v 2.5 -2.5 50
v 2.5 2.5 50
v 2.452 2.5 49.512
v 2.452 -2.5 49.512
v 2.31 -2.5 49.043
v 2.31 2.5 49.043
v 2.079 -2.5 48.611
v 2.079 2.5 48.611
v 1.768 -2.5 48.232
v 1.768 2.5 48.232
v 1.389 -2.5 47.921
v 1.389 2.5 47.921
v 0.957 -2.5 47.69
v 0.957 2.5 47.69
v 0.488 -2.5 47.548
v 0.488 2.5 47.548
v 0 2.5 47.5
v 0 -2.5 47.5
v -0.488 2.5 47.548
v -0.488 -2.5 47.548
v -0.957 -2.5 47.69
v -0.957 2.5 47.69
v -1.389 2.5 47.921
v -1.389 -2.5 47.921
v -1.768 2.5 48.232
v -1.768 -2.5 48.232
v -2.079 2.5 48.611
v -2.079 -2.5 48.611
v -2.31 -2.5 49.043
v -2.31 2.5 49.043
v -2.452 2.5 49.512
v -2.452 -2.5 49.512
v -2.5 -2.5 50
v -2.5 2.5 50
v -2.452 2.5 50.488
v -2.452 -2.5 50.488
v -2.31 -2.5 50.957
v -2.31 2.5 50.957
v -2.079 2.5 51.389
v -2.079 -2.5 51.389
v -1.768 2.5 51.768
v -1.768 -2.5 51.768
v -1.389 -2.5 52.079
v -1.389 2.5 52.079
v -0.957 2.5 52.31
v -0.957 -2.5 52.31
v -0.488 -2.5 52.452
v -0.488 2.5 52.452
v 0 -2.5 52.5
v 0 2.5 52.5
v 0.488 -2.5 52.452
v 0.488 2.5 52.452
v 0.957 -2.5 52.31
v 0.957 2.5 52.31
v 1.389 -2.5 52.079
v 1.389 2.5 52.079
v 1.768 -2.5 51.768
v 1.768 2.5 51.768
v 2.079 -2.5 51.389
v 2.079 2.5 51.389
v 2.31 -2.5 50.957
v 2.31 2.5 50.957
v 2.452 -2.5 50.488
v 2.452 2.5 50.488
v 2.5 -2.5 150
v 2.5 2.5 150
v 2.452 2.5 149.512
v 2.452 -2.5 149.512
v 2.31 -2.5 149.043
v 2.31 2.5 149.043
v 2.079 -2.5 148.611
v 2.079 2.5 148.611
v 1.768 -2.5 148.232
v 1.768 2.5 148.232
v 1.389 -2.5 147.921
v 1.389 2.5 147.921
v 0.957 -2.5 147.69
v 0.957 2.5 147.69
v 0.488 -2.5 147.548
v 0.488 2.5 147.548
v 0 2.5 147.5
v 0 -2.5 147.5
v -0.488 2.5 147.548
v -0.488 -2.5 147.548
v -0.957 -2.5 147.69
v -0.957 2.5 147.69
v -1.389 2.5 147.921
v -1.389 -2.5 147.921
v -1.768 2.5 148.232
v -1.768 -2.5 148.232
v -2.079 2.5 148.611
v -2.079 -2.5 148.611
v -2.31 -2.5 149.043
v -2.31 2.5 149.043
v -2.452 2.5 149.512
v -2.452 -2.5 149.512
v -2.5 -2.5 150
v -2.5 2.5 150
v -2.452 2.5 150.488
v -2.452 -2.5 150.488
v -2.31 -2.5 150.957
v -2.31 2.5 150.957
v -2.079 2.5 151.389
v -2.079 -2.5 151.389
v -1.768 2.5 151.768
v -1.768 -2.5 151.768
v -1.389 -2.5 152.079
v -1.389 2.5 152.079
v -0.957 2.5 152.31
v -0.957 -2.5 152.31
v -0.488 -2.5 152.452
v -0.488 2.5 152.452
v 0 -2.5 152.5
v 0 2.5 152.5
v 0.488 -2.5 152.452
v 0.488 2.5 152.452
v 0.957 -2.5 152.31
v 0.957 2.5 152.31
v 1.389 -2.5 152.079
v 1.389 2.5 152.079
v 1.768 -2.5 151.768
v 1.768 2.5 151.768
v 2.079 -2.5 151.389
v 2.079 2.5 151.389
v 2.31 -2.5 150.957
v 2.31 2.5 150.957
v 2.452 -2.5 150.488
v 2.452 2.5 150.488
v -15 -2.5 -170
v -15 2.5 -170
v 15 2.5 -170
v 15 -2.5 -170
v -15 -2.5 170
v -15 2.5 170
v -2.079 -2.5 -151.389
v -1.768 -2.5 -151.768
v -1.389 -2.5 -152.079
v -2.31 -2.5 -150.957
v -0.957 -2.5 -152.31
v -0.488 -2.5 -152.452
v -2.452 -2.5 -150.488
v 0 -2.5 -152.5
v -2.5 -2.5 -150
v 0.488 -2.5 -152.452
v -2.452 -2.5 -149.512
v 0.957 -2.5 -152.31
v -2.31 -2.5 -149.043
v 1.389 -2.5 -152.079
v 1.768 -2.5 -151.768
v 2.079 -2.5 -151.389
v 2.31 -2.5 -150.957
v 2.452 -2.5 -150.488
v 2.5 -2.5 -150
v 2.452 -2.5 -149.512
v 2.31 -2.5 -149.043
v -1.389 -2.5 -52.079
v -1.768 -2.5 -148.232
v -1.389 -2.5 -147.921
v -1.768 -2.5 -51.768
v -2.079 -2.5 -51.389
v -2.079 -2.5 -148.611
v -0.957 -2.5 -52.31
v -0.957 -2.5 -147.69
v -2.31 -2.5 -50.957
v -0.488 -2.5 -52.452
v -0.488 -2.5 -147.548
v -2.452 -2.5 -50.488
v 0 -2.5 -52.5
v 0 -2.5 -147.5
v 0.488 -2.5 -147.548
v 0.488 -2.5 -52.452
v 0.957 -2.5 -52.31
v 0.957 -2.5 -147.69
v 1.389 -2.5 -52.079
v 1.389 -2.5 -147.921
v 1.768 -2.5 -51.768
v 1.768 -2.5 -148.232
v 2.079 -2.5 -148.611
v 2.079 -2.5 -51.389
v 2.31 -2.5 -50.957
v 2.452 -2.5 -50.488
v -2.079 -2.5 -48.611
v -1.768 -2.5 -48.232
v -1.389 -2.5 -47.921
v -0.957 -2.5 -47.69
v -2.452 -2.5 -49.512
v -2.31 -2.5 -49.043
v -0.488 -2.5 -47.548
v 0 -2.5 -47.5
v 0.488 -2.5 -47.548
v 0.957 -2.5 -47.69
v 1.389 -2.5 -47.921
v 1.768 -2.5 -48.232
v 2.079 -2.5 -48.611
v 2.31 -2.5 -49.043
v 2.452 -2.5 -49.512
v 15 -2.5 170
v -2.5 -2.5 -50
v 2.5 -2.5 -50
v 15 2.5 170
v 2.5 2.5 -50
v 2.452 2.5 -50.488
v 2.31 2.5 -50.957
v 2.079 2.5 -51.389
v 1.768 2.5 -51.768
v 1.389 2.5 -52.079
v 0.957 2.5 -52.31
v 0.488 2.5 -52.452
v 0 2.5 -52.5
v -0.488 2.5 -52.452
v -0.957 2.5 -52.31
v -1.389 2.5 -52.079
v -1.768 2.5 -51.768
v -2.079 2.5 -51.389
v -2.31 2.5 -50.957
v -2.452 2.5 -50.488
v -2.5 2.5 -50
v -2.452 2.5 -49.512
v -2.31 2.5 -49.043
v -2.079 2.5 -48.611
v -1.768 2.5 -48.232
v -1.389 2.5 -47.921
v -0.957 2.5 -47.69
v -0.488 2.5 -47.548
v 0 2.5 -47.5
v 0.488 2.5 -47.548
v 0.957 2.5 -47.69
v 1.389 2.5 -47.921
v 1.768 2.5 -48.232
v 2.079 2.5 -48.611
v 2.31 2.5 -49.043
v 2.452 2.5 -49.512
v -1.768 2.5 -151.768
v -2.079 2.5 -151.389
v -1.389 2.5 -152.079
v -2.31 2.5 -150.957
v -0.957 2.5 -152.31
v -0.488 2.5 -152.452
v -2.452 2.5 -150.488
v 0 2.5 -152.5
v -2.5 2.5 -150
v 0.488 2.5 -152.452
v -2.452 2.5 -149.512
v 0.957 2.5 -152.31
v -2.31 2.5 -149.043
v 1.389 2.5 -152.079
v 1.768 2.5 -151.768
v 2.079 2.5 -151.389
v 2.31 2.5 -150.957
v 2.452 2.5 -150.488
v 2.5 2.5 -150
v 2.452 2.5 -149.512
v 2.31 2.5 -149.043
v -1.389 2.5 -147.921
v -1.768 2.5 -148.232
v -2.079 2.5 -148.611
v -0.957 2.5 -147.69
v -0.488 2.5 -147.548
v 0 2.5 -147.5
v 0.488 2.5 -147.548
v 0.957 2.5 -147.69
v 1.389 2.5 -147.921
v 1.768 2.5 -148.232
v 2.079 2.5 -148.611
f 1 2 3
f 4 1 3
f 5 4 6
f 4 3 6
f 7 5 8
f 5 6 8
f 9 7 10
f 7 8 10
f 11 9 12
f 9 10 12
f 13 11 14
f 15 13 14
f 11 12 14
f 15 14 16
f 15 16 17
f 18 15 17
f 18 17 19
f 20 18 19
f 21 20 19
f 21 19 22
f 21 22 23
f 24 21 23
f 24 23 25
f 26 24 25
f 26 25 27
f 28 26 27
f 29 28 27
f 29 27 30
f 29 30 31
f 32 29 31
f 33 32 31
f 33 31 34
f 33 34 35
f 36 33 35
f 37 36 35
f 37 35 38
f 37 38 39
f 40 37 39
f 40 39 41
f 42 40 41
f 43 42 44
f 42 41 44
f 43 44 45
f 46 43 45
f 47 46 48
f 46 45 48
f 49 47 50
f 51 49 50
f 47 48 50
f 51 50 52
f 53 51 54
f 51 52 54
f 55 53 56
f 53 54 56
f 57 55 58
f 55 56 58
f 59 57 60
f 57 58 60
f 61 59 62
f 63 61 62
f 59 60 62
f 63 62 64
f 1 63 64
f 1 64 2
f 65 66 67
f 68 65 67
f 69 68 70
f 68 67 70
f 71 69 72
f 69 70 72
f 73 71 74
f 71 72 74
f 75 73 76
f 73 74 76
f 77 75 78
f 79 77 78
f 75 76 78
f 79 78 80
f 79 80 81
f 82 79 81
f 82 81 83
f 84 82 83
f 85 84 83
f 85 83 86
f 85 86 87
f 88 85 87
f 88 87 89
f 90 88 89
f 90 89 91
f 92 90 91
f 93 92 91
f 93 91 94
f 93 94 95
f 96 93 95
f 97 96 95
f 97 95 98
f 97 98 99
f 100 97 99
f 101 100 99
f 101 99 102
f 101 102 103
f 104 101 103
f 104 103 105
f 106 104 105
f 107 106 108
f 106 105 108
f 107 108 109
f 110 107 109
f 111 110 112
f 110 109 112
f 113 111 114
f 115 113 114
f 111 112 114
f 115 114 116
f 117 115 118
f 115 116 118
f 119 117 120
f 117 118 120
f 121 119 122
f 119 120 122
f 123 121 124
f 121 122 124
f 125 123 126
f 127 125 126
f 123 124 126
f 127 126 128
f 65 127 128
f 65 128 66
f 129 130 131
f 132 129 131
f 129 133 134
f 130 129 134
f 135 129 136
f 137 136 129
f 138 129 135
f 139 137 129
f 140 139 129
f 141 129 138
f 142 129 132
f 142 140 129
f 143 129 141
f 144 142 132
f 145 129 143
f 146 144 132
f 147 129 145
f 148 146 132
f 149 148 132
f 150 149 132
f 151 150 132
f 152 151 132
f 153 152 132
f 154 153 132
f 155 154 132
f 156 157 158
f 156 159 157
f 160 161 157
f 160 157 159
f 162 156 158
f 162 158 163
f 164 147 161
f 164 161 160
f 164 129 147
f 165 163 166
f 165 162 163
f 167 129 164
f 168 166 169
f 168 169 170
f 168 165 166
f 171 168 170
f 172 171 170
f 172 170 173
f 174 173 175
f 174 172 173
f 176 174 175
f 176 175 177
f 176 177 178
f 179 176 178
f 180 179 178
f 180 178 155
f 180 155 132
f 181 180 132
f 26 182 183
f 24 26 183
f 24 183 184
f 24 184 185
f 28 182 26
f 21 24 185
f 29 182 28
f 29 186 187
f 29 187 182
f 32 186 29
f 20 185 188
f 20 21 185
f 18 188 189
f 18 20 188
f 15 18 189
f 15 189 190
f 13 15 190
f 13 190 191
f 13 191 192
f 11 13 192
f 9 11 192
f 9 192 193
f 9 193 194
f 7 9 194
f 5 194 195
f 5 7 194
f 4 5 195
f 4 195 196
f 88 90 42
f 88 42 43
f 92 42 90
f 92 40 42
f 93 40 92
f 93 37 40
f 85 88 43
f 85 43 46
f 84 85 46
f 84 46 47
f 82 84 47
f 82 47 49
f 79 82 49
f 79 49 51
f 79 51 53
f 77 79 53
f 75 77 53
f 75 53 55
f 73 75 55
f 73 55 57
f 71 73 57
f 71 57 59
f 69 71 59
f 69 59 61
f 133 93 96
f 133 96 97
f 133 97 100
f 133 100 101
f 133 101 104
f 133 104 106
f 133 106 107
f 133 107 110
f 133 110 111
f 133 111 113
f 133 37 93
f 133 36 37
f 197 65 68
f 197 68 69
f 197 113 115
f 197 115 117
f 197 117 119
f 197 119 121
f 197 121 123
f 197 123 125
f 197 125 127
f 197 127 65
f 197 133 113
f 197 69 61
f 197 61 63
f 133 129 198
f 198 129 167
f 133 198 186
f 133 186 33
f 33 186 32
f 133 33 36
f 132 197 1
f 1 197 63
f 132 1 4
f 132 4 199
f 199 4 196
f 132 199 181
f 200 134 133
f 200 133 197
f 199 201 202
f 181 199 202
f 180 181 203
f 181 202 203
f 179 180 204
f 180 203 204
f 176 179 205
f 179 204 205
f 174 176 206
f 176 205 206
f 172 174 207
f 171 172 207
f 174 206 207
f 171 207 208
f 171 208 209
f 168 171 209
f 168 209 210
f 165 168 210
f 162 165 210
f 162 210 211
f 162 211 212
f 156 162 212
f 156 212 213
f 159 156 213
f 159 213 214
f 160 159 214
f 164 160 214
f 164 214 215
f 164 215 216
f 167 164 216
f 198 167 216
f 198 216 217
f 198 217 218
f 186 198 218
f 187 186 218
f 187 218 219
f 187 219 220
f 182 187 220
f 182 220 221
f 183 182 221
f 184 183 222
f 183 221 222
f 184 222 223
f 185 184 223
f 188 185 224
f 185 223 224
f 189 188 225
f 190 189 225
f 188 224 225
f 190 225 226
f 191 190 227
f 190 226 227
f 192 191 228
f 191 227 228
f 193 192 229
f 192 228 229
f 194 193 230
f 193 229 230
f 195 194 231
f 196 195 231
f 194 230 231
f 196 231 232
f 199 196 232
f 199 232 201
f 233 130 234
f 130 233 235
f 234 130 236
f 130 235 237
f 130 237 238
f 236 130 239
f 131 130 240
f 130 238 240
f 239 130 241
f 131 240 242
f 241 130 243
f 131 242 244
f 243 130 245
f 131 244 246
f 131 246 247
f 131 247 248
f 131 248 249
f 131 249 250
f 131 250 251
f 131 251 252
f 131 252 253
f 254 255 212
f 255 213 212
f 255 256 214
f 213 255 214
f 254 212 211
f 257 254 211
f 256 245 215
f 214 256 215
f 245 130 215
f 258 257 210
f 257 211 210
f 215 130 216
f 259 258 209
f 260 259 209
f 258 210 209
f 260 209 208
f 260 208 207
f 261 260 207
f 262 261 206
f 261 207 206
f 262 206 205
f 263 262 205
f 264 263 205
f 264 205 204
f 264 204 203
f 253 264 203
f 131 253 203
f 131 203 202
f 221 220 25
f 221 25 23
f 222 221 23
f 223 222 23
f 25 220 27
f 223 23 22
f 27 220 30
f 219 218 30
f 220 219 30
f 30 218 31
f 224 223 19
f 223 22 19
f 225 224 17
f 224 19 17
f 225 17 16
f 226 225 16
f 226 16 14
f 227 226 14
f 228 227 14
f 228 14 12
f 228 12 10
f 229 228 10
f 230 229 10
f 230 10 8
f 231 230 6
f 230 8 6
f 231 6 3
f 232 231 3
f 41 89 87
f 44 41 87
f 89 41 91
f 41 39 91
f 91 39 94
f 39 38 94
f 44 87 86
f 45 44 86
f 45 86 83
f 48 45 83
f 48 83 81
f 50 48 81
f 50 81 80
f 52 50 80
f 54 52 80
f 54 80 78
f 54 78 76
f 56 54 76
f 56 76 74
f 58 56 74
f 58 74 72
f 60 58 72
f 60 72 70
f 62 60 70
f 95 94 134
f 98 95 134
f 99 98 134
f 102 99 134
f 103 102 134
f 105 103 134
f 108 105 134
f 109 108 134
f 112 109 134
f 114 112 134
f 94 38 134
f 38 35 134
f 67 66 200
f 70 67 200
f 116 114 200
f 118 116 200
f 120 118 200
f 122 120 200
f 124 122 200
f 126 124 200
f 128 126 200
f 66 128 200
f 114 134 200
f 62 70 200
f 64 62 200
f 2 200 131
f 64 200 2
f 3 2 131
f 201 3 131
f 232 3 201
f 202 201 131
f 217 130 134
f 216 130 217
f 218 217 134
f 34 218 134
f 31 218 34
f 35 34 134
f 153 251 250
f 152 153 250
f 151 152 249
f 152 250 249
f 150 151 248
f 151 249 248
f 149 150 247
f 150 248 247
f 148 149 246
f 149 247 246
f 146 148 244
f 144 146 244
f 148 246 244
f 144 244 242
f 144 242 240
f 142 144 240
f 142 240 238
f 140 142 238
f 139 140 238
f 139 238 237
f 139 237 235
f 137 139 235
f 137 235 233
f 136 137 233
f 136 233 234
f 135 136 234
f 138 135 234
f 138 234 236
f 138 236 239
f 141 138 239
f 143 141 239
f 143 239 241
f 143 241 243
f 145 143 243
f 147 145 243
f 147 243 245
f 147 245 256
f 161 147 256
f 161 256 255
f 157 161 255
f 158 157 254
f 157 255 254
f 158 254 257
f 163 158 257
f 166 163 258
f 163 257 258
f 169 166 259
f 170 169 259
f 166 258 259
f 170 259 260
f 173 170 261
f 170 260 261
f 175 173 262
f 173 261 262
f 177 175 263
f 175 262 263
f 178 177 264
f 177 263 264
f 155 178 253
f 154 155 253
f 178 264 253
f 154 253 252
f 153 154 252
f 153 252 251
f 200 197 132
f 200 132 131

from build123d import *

# Parameters (mm, degrees)
SKETCH1_W           = 30
SKETCH1_H           = 5
BOSS_EXTRUDE1_DEPTH = 170
SKETCH3_R           = 2.5
CUT_EXTRUDE1_DEPTH  = 6


with BuildPart() as part:
    # Sketch1 → Boss-Extrude1 (new body, symmetric)
    with BuildSketch(Plane.XY):
        Rectangle(SKETCH1_W, SKETCH1_H)
    extrude(amount=BOSS_EXTRUDE1_DEPTH, both=True)

    # Sketch3 → Cut-Extrude1 (cut, through all)
    with BuildSketch(Plane(origin=(0, 2.5, 0), x_dir=(1, 0, 0), z_dir=(0, 1, 0))):
        with Locations((0, -50)):
            Circle(SKETCH3_R)
        with Locations((0, -150)):
            Circle(SKETCH3_R)
        with Locations((0, 150)):
            Circle(SKETCH3_R)
        with Locations((0, 50)):
            Circle(SKETCH3_R)
    extrude(amount=-CUT_EXTRUDE1_DEPTH, mode=Mode.SUBTRACT)


solid = part.part
